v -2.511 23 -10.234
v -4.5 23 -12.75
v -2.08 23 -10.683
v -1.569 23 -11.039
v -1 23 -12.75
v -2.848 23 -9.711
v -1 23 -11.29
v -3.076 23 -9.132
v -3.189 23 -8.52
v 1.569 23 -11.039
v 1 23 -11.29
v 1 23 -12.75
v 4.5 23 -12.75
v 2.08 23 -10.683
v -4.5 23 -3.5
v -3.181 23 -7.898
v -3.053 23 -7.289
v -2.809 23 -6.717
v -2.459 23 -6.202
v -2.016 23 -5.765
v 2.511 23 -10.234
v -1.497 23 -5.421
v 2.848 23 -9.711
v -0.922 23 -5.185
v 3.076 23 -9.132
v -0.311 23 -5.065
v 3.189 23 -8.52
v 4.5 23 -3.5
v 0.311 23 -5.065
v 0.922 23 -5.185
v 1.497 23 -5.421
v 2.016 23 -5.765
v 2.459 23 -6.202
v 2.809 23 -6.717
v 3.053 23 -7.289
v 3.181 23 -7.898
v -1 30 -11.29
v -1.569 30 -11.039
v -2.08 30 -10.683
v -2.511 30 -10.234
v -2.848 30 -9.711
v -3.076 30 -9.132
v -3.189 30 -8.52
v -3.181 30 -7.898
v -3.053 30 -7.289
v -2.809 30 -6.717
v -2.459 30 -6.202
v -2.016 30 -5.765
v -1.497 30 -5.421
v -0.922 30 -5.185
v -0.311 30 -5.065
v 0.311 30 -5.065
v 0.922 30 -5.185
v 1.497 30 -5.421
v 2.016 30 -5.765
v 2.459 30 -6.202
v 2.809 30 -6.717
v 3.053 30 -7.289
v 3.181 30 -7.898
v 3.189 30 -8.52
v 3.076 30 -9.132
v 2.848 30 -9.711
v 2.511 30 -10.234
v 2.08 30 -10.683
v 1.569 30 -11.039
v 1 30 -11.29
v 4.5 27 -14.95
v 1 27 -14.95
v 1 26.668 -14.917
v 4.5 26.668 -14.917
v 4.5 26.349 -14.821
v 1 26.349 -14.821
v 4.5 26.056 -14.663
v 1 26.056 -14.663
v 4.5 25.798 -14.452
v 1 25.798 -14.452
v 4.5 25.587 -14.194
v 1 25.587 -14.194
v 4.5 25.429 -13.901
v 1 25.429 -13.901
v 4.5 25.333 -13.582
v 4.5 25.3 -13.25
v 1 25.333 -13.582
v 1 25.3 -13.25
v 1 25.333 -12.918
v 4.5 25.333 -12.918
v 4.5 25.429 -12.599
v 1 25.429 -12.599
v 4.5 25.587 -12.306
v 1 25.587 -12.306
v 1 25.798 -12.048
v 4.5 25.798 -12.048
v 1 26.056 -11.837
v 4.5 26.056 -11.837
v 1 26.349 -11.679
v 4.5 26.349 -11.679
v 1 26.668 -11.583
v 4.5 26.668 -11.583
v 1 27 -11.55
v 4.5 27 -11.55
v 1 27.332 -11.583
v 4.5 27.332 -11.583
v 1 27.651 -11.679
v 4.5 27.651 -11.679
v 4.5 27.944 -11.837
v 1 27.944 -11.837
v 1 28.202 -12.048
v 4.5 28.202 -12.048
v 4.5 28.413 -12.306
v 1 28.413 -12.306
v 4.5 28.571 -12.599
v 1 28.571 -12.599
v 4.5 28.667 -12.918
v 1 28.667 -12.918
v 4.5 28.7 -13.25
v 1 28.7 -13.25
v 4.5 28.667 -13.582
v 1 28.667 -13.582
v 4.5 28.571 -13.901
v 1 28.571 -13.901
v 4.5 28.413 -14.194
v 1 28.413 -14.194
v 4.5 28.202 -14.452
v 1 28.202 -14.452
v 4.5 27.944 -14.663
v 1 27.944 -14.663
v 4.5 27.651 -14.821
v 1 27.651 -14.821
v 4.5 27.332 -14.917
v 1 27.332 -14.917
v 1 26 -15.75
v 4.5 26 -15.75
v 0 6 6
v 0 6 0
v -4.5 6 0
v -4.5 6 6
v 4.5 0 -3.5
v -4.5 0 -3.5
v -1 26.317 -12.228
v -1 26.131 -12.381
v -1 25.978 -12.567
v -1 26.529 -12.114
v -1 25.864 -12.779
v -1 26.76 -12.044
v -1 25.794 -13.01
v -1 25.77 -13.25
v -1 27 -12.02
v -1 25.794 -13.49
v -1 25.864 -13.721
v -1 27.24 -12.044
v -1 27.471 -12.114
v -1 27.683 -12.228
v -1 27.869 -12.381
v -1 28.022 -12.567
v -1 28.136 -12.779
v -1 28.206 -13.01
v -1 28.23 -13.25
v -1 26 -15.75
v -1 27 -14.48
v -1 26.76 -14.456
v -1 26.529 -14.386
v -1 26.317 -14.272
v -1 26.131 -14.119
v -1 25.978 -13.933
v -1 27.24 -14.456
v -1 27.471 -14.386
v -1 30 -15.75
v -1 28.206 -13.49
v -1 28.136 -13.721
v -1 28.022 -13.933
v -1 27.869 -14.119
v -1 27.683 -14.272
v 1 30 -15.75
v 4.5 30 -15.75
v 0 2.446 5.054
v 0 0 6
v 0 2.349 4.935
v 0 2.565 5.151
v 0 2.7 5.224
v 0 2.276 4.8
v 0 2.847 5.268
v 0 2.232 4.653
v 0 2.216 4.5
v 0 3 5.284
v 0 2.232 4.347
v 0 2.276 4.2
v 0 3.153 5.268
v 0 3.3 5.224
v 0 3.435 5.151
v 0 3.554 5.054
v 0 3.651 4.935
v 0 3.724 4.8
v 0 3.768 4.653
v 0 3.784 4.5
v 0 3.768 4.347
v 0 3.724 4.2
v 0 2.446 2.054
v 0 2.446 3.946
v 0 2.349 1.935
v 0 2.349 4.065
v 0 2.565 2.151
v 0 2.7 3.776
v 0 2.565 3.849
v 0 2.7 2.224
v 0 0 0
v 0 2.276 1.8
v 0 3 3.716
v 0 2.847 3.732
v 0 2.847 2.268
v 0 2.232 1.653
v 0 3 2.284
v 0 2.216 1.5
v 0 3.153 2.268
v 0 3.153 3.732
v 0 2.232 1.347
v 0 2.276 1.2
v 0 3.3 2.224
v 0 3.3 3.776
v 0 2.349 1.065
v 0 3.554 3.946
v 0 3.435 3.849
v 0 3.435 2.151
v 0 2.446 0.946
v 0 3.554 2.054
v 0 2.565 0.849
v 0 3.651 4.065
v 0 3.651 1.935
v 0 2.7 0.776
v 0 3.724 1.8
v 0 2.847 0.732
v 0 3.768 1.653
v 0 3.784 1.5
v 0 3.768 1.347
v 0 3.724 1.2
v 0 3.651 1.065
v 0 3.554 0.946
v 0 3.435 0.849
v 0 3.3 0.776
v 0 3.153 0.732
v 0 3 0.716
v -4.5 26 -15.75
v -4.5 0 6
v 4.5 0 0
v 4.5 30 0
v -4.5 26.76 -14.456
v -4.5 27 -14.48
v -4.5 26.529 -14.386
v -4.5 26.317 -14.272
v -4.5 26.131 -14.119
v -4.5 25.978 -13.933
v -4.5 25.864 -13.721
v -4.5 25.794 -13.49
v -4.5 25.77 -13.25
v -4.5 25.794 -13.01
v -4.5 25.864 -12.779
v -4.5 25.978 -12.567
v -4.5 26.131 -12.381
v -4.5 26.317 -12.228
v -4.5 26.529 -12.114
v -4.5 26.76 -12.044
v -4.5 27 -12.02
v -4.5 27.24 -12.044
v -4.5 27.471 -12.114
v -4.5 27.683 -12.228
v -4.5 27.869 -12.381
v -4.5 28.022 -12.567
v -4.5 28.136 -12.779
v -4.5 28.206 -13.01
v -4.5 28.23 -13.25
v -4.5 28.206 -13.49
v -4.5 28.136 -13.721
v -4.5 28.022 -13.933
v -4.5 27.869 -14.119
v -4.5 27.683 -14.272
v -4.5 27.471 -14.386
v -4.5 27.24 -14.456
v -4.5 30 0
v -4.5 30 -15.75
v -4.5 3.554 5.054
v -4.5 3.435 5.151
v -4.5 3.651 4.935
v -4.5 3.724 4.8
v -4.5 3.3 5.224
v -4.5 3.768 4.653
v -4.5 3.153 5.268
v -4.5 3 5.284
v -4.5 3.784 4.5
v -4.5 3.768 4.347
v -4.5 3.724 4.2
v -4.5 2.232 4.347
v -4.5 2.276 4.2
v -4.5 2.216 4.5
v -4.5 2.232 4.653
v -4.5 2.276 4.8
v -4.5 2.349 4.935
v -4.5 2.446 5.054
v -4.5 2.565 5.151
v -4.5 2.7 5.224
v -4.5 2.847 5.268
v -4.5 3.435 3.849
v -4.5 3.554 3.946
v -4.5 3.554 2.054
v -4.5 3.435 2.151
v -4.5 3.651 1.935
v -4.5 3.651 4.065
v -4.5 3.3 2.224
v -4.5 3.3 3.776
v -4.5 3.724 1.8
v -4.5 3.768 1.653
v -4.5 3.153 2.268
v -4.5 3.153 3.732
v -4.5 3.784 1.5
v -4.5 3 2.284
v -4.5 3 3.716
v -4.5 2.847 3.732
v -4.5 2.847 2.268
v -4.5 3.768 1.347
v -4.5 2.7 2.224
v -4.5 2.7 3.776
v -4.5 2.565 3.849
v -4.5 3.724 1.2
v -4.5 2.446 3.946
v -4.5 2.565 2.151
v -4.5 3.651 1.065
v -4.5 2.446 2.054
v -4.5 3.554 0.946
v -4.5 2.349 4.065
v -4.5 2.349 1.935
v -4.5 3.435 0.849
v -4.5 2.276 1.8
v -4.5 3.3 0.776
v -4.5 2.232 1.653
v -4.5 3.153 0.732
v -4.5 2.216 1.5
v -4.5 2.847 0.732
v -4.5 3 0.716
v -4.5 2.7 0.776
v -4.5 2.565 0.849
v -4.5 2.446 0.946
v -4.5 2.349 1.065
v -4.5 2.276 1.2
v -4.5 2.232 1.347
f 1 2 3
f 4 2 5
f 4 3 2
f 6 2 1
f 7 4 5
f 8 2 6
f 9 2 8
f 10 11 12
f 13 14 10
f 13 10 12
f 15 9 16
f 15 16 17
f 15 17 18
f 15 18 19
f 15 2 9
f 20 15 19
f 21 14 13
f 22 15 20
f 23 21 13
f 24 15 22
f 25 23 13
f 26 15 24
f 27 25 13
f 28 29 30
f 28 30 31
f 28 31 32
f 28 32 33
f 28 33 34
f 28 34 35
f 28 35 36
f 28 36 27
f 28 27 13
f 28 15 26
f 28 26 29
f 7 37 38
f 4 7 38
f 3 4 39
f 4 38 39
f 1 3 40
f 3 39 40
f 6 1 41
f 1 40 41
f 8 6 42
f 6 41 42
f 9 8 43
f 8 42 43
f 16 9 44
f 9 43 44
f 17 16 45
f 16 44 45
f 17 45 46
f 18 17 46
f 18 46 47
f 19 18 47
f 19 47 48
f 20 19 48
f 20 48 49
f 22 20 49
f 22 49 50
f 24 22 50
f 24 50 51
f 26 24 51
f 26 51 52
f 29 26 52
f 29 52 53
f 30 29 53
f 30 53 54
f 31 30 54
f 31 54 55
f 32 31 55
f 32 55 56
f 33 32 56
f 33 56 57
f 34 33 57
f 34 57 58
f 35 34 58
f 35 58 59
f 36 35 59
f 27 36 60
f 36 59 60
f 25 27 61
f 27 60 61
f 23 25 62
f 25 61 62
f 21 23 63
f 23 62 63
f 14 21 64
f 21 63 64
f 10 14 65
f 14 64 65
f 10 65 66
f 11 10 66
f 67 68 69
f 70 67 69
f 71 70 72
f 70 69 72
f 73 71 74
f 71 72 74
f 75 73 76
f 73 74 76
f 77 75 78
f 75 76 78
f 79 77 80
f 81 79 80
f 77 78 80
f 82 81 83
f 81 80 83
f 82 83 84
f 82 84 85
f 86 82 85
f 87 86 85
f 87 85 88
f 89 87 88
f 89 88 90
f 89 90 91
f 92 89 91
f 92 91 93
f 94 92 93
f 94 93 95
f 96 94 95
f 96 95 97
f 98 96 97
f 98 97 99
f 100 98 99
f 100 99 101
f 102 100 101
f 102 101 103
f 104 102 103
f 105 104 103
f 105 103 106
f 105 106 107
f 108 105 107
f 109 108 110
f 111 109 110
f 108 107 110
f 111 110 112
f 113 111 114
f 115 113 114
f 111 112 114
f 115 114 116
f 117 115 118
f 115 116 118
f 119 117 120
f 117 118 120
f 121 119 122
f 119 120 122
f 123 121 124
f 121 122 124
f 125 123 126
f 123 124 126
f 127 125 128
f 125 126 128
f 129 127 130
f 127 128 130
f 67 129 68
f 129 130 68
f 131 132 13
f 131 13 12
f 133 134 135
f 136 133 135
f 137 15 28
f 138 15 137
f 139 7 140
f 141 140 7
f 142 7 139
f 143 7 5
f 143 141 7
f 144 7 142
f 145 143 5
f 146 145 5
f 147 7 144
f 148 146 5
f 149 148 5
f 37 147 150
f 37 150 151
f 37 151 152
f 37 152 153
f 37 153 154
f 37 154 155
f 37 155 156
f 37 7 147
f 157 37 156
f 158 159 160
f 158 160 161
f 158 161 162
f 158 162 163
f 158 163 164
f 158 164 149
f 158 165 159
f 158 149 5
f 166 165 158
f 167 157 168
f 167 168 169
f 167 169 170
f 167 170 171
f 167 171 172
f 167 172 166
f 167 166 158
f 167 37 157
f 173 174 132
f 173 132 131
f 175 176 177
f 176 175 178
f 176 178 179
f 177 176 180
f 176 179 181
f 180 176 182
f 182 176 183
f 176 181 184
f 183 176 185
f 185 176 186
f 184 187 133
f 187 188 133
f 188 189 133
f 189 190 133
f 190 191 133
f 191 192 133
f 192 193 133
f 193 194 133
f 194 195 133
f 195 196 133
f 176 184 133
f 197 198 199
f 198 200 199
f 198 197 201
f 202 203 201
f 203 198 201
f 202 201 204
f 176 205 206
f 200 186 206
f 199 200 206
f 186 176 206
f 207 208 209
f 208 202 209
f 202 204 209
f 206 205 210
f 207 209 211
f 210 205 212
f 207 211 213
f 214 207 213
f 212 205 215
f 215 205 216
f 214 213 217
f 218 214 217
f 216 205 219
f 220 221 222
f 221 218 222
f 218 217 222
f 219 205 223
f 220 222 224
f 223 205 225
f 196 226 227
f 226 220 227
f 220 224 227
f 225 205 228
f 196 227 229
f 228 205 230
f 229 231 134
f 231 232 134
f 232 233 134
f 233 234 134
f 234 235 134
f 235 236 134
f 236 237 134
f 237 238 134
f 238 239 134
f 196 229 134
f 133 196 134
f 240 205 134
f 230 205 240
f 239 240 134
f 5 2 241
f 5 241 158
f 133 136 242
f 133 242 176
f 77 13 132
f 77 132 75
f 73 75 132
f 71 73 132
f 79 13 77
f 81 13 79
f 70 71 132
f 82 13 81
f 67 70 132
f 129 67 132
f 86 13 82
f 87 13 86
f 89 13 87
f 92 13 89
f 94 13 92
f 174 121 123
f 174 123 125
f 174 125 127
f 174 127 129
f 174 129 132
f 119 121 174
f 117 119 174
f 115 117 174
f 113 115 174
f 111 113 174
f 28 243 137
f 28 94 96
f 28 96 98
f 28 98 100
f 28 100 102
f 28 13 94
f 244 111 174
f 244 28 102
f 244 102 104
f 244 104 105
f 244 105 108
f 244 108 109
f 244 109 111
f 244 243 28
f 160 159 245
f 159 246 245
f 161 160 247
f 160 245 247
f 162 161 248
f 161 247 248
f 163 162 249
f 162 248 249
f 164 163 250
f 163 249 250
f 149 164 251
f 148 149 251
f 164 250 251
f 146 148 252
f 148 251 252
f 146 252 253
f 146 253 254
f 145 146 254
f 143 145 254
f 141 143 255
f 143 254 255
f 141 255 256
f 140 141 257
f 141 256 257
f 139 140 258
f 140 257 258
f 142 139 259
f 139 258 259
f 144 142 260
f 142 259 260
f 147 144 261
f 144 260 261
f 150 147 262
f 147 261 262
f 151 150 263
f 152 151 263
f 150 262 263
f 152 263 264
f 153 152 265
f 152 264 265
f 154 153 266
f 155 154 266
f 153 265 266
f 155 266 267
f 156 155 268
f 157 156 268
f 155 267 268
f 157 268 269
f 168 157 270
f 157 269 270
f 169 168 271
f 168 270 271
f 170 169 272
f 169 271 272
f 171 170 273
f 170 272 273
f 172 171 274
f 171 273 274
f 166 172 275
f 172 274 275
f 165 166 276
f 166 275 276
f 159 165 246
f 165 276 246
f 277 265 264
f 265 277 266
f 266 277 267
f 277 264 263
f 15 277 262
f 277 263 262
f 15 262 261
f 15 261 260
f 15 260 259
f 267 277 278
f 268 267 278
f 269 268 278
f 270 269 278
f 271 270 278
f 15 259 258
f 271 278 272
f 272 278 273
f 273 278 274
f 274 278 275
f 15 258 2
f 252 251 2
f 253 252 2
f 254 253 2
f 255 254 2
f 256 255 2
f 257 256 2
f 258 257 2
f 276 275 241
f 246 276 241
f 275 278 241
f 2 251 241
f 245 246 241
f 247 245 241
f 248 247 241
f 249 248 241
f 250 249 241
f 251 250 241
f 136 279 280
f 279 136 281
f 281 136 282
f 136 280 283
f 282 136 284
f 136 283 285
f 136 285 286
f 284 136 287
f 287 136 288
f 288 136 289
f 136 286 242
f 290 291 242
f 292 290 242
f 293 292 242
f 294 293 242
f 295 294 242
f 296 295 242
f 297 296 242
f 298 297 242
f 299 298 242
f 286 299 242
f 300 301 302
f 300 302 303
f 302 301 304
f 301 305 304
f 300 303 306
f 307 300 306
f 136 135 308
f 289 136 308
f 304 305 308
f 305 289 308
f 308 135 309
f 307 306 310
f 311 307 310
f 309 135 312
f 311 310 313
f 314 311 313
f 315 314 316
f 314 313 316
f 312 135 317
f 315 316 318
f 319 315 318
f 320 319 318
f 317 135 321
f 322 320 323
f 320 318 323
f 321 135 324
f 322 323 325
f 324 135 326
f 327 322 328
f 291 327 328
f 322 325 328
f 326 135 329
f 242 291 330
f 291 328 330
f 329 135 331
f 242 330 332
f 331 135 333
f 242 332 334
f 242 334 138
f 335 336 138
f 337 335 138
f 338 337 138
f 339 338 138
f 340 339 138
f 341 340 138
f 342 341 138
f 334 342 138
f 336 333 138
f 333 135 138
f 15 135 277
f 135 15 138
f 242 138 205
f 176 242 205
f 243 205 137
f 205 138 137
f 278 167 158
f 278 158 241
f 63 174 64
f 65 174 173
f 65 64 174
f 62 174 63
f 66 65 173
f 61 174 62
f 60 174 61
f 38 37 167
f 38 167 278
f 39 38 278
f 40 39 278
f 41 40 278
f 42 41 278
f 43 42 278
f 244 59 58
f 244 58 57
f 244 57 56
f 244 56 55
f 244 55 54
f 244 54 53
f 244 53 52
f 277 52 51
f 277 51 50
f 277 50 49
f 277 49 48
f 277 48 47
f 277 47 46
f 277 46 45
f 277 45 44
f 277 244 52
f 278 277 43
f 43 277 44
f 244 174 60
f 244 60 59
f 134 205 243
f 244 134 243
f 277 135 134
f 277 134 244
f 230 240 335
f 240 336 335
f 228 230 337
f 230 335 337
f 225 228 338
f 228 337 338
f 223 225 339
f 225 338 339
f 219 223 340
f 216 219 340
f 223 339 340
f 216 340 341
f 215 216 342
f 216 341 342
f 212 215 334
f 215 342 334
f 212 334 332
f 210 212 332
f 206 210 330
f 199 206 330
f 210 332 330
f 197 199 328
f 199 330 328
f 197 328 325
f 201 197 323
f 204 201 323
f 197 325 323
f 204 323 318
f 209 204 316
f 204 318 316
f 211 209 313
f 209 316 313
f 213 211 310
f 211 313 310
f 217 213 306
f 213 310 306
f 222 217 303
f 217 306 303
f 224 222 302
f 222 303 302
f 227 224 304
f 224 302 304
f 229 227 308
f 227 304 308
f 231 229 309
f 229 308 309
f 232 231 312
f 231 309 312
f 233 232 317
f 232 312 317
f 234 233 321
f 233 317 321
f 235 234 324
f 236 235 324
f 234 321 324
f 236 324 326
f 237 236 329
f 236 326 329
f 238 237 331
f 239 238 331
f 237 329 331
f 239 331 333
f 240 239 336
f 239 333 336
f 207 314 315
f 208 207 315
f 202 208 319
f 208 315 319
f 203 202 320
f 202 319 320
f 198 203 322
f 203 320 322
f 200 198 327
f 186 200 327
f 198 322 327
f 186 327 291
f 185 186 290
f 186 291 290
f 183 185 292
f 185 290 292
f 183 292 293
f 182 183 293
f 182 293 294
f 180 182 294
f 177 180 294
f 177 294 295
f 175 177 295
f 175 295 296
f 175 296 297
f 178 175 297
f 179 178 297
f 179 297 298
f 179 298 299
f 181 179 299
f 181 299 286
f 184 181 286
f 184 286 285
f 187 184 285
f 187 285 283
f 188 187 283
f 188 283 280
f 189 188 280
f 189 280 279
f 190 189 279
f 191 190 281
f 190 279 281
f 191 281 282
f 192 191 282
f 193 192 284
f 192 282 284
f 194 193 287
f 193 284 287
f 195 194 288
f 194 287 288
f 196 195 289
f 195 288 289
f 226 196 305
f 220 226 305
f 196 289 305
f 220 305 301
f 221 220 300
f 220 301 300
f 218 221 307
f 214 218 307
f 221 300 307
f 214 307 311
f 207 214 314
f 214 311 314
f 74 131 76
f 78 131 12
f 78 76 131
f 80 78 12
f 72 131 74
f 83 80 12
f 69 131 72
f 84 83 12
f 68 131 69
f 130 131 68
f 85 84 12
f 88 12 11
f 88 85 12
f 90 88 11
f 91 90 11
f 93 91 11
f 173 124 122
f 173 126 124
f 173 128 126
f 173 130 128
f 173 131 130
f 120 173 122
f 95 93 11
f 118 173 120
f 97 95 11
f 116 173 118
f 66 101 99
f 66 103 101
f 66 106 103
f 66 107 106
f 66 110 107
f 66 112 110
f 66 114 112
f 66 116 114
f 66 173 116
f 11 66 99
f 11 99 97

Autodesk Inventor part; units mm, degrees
ref_plane "YZ Plane" through (0, 0, 0) normal (1, 0, 0) x (0, 1, 0)
ref_plane "XZ Plane" through (0, 0, 0) normal (0, 1, 0) x (-1, 0, 0)
sketch "Sketch1" plane through (0, 0, 0) normal (1, 0, 0) x (0, 1, 0)
  line L0 (0, 0) -> (30, 0)
  line L1 (30, 0) -> (30, -3.5)
  line L2 (30, -3.5) -> (0, -3.5)
  line L3 (0, -3.5) -> (0, 0)
  dimension "d0" = 3.5
  dimension "d1" = 30
extrude "Extrusion1" add sketch "Sketch1" along normal mid plane 9
sketch "Sketch2" plane through (-4.5, 0, -3.5) normal (0, 0, -1) x (-1, 0, 0)
  line L0 (-9, 30) -> (0, 30) projected
  line L1 (0, 0) -> (0, 30) projected
  line L2 (-9, 30) -> (0, 30)
  line L3 (0, 30) -> (0, 23)
  line L4 (0, 23) -> (-9, 23)
  line L5 (-9, 23) -> (-9, 30)
  point P0 (-4.5, 0)
  dimension "d4" = 7
extrude "Extrusion2" add sketch "Sketch2" along normal blind 12.25
ref_plane "Work Plane1" through (0, 0, 0) normal (-1, 0, 0) x (0, 0, 1)
sketch "Sketch3" plane through (-4.5, 0, 0) normal (0, 0, 1) x (1, 0, 0)
  line L0 (4.5, 0) -> (9, 0) projected
  line L1 (0, 0) -> (4.5, 0)
  line L2 (4.5, 0) -> (4.5, 6)
  line L3 (4.5, 6) -> (0, 6)
  line L4 (0, 6) -> (0, 0)
  line L5 (9, 30) -> (0, 30) projected
  line L6 (4.5, -6) -> (4.5, 36) projected
  point P0 (4.5, 30)
  dimension "d7" = 4.5
  dimension "d8" = 4.5
  dimension "d9" = 6
extrude "Extrusion3" add sketch "Sketch3" along normal blind 6
sketch "Sketch7" plane through (-4.5, 30, 0) normal (0, 1, 0) x (1, 0, 0)
  circle A0 centre (4.5, 8.25) radius 3.2004
  line L0 (0, 15.75) -> (9, 15.75) projected
  point P0 (4.5, 0)
  dimension "d42" = 6.4008
  dimension "d43" = 7.5
extrude "Extrusion6" cut sketch "Sketch7" against normal up to next
sketch "Sketch8" plane through (-4.5, 30, 0) normal (0, 1, 0) x (1, 0, 0)
  line L0 (9, 15.75) -> (0, 15.75) projected
  line L1 (5.5, 7.75) -> (3.5, 7.75)
  line L2 (3.5, 7.75) -> (3.5, 15.75)
  line L3 (3.5, 15.75) -> (5.5, 15.75)
  line L4 (5.5, 15.75) -> (5.5, 7.75)
  line L5 (5.5, 7.75) -> (3.5, 15.75) construction
  line L6 (3.5, 7.75) -> (5.5, 15.75) construction
  line L7 (4.5, -3.15) -> (4.5, 18.9) projected
  point P0 (4.5, 0)
  point P1 (4.5, 11.75)
  dimension "d46" = 8
  dimension "d47" = 2
  dimension "d48" = 1
extrude "Extrusion7" cut sketch "Sketch8" against normal up to next
sketch "Sketch9" plane through (4.5, 0, 0) normal (1, 0, 0) x (0, 0, -1)
  line L0 (0, 30) -> (15.75, 30) projected
  line L1 (15.75, 30) -> (15.75, 23) projected
  point P0 (0, 0)
  point P1 (13.25, 27)
  dimension "d51" = 3
  dimension "d52" = 2.5
hole "Hole2" at (4.5, 27, -13.25) direction (-1, 0, 0) diameter 3.4 depth 3.5 clearance for "Flat Head Machine Screw" size "M3" standard "Ansi Metric M Profile"
sketch "Sketch10" plane through (-1, 30, -11.2902) normal (1, 0, 0) x (0, 0, -1)
  circle A0 centre (1.9598, -3) radius 1.7 projected
  point P0 (-11.2902, -30)
  point P1 (3.0161, 3.0772)
hole "Hole3" at (-1, 27, -13.25) direction (-1, 0, 0) diameter 2.459 depth 3.5 thread size "M3x0.5" class "6H" standard "ANSI Metric M Profile"
chamfer "Chamfer1" distance 3 angle 45 2 edges at (2.75, 23, -15.75) (-2.75, 23, -15.75)
sketch "Sketch13" plane through (0, 0, 0) normal (1, 0, 0) x (0, 0, -1)
  line L0 (0, 0) -> (-6, 0) projected
  line L1 (-6, 0) -> (-6, 6) projected
  line L2 (0, 6) -> (-6, 6) projected
  line L3 (0, 30) -> (0, 0) projected
  point P0 (-4.5, 3)
  dimension "d91" = 3
  dimension "d92" = 4.5
hole "Hole4" at (0, 3, 4.5) direction (-1, 0, 0) diameter 1.567 end through all thread size "M2x0.4" class "6H" standard "ANSI Metric M Profile"
sketch "Sketch14" plane through (0, 0, 0) normal (1, 0, 0) x (0, 0, -1)
  line L0 (-6, 0) -> (-6, 6) projected
  line L1 (0, 6) -> (-6, 6) projected
  point P0 (0, 0)
  point P1 (-1.5, 3)
  dimension "d100" = 4.5
  dimension "d101" = 3
hole "Hole5" at (0, 3, 1.5) direction (-1, 0, 0) diameter 1.567 end through all thread size "M2x0.4" class "6H" standard "ANSI Metric M Profile"
properties part number "MEM to dovetail rod adapter - v3"
